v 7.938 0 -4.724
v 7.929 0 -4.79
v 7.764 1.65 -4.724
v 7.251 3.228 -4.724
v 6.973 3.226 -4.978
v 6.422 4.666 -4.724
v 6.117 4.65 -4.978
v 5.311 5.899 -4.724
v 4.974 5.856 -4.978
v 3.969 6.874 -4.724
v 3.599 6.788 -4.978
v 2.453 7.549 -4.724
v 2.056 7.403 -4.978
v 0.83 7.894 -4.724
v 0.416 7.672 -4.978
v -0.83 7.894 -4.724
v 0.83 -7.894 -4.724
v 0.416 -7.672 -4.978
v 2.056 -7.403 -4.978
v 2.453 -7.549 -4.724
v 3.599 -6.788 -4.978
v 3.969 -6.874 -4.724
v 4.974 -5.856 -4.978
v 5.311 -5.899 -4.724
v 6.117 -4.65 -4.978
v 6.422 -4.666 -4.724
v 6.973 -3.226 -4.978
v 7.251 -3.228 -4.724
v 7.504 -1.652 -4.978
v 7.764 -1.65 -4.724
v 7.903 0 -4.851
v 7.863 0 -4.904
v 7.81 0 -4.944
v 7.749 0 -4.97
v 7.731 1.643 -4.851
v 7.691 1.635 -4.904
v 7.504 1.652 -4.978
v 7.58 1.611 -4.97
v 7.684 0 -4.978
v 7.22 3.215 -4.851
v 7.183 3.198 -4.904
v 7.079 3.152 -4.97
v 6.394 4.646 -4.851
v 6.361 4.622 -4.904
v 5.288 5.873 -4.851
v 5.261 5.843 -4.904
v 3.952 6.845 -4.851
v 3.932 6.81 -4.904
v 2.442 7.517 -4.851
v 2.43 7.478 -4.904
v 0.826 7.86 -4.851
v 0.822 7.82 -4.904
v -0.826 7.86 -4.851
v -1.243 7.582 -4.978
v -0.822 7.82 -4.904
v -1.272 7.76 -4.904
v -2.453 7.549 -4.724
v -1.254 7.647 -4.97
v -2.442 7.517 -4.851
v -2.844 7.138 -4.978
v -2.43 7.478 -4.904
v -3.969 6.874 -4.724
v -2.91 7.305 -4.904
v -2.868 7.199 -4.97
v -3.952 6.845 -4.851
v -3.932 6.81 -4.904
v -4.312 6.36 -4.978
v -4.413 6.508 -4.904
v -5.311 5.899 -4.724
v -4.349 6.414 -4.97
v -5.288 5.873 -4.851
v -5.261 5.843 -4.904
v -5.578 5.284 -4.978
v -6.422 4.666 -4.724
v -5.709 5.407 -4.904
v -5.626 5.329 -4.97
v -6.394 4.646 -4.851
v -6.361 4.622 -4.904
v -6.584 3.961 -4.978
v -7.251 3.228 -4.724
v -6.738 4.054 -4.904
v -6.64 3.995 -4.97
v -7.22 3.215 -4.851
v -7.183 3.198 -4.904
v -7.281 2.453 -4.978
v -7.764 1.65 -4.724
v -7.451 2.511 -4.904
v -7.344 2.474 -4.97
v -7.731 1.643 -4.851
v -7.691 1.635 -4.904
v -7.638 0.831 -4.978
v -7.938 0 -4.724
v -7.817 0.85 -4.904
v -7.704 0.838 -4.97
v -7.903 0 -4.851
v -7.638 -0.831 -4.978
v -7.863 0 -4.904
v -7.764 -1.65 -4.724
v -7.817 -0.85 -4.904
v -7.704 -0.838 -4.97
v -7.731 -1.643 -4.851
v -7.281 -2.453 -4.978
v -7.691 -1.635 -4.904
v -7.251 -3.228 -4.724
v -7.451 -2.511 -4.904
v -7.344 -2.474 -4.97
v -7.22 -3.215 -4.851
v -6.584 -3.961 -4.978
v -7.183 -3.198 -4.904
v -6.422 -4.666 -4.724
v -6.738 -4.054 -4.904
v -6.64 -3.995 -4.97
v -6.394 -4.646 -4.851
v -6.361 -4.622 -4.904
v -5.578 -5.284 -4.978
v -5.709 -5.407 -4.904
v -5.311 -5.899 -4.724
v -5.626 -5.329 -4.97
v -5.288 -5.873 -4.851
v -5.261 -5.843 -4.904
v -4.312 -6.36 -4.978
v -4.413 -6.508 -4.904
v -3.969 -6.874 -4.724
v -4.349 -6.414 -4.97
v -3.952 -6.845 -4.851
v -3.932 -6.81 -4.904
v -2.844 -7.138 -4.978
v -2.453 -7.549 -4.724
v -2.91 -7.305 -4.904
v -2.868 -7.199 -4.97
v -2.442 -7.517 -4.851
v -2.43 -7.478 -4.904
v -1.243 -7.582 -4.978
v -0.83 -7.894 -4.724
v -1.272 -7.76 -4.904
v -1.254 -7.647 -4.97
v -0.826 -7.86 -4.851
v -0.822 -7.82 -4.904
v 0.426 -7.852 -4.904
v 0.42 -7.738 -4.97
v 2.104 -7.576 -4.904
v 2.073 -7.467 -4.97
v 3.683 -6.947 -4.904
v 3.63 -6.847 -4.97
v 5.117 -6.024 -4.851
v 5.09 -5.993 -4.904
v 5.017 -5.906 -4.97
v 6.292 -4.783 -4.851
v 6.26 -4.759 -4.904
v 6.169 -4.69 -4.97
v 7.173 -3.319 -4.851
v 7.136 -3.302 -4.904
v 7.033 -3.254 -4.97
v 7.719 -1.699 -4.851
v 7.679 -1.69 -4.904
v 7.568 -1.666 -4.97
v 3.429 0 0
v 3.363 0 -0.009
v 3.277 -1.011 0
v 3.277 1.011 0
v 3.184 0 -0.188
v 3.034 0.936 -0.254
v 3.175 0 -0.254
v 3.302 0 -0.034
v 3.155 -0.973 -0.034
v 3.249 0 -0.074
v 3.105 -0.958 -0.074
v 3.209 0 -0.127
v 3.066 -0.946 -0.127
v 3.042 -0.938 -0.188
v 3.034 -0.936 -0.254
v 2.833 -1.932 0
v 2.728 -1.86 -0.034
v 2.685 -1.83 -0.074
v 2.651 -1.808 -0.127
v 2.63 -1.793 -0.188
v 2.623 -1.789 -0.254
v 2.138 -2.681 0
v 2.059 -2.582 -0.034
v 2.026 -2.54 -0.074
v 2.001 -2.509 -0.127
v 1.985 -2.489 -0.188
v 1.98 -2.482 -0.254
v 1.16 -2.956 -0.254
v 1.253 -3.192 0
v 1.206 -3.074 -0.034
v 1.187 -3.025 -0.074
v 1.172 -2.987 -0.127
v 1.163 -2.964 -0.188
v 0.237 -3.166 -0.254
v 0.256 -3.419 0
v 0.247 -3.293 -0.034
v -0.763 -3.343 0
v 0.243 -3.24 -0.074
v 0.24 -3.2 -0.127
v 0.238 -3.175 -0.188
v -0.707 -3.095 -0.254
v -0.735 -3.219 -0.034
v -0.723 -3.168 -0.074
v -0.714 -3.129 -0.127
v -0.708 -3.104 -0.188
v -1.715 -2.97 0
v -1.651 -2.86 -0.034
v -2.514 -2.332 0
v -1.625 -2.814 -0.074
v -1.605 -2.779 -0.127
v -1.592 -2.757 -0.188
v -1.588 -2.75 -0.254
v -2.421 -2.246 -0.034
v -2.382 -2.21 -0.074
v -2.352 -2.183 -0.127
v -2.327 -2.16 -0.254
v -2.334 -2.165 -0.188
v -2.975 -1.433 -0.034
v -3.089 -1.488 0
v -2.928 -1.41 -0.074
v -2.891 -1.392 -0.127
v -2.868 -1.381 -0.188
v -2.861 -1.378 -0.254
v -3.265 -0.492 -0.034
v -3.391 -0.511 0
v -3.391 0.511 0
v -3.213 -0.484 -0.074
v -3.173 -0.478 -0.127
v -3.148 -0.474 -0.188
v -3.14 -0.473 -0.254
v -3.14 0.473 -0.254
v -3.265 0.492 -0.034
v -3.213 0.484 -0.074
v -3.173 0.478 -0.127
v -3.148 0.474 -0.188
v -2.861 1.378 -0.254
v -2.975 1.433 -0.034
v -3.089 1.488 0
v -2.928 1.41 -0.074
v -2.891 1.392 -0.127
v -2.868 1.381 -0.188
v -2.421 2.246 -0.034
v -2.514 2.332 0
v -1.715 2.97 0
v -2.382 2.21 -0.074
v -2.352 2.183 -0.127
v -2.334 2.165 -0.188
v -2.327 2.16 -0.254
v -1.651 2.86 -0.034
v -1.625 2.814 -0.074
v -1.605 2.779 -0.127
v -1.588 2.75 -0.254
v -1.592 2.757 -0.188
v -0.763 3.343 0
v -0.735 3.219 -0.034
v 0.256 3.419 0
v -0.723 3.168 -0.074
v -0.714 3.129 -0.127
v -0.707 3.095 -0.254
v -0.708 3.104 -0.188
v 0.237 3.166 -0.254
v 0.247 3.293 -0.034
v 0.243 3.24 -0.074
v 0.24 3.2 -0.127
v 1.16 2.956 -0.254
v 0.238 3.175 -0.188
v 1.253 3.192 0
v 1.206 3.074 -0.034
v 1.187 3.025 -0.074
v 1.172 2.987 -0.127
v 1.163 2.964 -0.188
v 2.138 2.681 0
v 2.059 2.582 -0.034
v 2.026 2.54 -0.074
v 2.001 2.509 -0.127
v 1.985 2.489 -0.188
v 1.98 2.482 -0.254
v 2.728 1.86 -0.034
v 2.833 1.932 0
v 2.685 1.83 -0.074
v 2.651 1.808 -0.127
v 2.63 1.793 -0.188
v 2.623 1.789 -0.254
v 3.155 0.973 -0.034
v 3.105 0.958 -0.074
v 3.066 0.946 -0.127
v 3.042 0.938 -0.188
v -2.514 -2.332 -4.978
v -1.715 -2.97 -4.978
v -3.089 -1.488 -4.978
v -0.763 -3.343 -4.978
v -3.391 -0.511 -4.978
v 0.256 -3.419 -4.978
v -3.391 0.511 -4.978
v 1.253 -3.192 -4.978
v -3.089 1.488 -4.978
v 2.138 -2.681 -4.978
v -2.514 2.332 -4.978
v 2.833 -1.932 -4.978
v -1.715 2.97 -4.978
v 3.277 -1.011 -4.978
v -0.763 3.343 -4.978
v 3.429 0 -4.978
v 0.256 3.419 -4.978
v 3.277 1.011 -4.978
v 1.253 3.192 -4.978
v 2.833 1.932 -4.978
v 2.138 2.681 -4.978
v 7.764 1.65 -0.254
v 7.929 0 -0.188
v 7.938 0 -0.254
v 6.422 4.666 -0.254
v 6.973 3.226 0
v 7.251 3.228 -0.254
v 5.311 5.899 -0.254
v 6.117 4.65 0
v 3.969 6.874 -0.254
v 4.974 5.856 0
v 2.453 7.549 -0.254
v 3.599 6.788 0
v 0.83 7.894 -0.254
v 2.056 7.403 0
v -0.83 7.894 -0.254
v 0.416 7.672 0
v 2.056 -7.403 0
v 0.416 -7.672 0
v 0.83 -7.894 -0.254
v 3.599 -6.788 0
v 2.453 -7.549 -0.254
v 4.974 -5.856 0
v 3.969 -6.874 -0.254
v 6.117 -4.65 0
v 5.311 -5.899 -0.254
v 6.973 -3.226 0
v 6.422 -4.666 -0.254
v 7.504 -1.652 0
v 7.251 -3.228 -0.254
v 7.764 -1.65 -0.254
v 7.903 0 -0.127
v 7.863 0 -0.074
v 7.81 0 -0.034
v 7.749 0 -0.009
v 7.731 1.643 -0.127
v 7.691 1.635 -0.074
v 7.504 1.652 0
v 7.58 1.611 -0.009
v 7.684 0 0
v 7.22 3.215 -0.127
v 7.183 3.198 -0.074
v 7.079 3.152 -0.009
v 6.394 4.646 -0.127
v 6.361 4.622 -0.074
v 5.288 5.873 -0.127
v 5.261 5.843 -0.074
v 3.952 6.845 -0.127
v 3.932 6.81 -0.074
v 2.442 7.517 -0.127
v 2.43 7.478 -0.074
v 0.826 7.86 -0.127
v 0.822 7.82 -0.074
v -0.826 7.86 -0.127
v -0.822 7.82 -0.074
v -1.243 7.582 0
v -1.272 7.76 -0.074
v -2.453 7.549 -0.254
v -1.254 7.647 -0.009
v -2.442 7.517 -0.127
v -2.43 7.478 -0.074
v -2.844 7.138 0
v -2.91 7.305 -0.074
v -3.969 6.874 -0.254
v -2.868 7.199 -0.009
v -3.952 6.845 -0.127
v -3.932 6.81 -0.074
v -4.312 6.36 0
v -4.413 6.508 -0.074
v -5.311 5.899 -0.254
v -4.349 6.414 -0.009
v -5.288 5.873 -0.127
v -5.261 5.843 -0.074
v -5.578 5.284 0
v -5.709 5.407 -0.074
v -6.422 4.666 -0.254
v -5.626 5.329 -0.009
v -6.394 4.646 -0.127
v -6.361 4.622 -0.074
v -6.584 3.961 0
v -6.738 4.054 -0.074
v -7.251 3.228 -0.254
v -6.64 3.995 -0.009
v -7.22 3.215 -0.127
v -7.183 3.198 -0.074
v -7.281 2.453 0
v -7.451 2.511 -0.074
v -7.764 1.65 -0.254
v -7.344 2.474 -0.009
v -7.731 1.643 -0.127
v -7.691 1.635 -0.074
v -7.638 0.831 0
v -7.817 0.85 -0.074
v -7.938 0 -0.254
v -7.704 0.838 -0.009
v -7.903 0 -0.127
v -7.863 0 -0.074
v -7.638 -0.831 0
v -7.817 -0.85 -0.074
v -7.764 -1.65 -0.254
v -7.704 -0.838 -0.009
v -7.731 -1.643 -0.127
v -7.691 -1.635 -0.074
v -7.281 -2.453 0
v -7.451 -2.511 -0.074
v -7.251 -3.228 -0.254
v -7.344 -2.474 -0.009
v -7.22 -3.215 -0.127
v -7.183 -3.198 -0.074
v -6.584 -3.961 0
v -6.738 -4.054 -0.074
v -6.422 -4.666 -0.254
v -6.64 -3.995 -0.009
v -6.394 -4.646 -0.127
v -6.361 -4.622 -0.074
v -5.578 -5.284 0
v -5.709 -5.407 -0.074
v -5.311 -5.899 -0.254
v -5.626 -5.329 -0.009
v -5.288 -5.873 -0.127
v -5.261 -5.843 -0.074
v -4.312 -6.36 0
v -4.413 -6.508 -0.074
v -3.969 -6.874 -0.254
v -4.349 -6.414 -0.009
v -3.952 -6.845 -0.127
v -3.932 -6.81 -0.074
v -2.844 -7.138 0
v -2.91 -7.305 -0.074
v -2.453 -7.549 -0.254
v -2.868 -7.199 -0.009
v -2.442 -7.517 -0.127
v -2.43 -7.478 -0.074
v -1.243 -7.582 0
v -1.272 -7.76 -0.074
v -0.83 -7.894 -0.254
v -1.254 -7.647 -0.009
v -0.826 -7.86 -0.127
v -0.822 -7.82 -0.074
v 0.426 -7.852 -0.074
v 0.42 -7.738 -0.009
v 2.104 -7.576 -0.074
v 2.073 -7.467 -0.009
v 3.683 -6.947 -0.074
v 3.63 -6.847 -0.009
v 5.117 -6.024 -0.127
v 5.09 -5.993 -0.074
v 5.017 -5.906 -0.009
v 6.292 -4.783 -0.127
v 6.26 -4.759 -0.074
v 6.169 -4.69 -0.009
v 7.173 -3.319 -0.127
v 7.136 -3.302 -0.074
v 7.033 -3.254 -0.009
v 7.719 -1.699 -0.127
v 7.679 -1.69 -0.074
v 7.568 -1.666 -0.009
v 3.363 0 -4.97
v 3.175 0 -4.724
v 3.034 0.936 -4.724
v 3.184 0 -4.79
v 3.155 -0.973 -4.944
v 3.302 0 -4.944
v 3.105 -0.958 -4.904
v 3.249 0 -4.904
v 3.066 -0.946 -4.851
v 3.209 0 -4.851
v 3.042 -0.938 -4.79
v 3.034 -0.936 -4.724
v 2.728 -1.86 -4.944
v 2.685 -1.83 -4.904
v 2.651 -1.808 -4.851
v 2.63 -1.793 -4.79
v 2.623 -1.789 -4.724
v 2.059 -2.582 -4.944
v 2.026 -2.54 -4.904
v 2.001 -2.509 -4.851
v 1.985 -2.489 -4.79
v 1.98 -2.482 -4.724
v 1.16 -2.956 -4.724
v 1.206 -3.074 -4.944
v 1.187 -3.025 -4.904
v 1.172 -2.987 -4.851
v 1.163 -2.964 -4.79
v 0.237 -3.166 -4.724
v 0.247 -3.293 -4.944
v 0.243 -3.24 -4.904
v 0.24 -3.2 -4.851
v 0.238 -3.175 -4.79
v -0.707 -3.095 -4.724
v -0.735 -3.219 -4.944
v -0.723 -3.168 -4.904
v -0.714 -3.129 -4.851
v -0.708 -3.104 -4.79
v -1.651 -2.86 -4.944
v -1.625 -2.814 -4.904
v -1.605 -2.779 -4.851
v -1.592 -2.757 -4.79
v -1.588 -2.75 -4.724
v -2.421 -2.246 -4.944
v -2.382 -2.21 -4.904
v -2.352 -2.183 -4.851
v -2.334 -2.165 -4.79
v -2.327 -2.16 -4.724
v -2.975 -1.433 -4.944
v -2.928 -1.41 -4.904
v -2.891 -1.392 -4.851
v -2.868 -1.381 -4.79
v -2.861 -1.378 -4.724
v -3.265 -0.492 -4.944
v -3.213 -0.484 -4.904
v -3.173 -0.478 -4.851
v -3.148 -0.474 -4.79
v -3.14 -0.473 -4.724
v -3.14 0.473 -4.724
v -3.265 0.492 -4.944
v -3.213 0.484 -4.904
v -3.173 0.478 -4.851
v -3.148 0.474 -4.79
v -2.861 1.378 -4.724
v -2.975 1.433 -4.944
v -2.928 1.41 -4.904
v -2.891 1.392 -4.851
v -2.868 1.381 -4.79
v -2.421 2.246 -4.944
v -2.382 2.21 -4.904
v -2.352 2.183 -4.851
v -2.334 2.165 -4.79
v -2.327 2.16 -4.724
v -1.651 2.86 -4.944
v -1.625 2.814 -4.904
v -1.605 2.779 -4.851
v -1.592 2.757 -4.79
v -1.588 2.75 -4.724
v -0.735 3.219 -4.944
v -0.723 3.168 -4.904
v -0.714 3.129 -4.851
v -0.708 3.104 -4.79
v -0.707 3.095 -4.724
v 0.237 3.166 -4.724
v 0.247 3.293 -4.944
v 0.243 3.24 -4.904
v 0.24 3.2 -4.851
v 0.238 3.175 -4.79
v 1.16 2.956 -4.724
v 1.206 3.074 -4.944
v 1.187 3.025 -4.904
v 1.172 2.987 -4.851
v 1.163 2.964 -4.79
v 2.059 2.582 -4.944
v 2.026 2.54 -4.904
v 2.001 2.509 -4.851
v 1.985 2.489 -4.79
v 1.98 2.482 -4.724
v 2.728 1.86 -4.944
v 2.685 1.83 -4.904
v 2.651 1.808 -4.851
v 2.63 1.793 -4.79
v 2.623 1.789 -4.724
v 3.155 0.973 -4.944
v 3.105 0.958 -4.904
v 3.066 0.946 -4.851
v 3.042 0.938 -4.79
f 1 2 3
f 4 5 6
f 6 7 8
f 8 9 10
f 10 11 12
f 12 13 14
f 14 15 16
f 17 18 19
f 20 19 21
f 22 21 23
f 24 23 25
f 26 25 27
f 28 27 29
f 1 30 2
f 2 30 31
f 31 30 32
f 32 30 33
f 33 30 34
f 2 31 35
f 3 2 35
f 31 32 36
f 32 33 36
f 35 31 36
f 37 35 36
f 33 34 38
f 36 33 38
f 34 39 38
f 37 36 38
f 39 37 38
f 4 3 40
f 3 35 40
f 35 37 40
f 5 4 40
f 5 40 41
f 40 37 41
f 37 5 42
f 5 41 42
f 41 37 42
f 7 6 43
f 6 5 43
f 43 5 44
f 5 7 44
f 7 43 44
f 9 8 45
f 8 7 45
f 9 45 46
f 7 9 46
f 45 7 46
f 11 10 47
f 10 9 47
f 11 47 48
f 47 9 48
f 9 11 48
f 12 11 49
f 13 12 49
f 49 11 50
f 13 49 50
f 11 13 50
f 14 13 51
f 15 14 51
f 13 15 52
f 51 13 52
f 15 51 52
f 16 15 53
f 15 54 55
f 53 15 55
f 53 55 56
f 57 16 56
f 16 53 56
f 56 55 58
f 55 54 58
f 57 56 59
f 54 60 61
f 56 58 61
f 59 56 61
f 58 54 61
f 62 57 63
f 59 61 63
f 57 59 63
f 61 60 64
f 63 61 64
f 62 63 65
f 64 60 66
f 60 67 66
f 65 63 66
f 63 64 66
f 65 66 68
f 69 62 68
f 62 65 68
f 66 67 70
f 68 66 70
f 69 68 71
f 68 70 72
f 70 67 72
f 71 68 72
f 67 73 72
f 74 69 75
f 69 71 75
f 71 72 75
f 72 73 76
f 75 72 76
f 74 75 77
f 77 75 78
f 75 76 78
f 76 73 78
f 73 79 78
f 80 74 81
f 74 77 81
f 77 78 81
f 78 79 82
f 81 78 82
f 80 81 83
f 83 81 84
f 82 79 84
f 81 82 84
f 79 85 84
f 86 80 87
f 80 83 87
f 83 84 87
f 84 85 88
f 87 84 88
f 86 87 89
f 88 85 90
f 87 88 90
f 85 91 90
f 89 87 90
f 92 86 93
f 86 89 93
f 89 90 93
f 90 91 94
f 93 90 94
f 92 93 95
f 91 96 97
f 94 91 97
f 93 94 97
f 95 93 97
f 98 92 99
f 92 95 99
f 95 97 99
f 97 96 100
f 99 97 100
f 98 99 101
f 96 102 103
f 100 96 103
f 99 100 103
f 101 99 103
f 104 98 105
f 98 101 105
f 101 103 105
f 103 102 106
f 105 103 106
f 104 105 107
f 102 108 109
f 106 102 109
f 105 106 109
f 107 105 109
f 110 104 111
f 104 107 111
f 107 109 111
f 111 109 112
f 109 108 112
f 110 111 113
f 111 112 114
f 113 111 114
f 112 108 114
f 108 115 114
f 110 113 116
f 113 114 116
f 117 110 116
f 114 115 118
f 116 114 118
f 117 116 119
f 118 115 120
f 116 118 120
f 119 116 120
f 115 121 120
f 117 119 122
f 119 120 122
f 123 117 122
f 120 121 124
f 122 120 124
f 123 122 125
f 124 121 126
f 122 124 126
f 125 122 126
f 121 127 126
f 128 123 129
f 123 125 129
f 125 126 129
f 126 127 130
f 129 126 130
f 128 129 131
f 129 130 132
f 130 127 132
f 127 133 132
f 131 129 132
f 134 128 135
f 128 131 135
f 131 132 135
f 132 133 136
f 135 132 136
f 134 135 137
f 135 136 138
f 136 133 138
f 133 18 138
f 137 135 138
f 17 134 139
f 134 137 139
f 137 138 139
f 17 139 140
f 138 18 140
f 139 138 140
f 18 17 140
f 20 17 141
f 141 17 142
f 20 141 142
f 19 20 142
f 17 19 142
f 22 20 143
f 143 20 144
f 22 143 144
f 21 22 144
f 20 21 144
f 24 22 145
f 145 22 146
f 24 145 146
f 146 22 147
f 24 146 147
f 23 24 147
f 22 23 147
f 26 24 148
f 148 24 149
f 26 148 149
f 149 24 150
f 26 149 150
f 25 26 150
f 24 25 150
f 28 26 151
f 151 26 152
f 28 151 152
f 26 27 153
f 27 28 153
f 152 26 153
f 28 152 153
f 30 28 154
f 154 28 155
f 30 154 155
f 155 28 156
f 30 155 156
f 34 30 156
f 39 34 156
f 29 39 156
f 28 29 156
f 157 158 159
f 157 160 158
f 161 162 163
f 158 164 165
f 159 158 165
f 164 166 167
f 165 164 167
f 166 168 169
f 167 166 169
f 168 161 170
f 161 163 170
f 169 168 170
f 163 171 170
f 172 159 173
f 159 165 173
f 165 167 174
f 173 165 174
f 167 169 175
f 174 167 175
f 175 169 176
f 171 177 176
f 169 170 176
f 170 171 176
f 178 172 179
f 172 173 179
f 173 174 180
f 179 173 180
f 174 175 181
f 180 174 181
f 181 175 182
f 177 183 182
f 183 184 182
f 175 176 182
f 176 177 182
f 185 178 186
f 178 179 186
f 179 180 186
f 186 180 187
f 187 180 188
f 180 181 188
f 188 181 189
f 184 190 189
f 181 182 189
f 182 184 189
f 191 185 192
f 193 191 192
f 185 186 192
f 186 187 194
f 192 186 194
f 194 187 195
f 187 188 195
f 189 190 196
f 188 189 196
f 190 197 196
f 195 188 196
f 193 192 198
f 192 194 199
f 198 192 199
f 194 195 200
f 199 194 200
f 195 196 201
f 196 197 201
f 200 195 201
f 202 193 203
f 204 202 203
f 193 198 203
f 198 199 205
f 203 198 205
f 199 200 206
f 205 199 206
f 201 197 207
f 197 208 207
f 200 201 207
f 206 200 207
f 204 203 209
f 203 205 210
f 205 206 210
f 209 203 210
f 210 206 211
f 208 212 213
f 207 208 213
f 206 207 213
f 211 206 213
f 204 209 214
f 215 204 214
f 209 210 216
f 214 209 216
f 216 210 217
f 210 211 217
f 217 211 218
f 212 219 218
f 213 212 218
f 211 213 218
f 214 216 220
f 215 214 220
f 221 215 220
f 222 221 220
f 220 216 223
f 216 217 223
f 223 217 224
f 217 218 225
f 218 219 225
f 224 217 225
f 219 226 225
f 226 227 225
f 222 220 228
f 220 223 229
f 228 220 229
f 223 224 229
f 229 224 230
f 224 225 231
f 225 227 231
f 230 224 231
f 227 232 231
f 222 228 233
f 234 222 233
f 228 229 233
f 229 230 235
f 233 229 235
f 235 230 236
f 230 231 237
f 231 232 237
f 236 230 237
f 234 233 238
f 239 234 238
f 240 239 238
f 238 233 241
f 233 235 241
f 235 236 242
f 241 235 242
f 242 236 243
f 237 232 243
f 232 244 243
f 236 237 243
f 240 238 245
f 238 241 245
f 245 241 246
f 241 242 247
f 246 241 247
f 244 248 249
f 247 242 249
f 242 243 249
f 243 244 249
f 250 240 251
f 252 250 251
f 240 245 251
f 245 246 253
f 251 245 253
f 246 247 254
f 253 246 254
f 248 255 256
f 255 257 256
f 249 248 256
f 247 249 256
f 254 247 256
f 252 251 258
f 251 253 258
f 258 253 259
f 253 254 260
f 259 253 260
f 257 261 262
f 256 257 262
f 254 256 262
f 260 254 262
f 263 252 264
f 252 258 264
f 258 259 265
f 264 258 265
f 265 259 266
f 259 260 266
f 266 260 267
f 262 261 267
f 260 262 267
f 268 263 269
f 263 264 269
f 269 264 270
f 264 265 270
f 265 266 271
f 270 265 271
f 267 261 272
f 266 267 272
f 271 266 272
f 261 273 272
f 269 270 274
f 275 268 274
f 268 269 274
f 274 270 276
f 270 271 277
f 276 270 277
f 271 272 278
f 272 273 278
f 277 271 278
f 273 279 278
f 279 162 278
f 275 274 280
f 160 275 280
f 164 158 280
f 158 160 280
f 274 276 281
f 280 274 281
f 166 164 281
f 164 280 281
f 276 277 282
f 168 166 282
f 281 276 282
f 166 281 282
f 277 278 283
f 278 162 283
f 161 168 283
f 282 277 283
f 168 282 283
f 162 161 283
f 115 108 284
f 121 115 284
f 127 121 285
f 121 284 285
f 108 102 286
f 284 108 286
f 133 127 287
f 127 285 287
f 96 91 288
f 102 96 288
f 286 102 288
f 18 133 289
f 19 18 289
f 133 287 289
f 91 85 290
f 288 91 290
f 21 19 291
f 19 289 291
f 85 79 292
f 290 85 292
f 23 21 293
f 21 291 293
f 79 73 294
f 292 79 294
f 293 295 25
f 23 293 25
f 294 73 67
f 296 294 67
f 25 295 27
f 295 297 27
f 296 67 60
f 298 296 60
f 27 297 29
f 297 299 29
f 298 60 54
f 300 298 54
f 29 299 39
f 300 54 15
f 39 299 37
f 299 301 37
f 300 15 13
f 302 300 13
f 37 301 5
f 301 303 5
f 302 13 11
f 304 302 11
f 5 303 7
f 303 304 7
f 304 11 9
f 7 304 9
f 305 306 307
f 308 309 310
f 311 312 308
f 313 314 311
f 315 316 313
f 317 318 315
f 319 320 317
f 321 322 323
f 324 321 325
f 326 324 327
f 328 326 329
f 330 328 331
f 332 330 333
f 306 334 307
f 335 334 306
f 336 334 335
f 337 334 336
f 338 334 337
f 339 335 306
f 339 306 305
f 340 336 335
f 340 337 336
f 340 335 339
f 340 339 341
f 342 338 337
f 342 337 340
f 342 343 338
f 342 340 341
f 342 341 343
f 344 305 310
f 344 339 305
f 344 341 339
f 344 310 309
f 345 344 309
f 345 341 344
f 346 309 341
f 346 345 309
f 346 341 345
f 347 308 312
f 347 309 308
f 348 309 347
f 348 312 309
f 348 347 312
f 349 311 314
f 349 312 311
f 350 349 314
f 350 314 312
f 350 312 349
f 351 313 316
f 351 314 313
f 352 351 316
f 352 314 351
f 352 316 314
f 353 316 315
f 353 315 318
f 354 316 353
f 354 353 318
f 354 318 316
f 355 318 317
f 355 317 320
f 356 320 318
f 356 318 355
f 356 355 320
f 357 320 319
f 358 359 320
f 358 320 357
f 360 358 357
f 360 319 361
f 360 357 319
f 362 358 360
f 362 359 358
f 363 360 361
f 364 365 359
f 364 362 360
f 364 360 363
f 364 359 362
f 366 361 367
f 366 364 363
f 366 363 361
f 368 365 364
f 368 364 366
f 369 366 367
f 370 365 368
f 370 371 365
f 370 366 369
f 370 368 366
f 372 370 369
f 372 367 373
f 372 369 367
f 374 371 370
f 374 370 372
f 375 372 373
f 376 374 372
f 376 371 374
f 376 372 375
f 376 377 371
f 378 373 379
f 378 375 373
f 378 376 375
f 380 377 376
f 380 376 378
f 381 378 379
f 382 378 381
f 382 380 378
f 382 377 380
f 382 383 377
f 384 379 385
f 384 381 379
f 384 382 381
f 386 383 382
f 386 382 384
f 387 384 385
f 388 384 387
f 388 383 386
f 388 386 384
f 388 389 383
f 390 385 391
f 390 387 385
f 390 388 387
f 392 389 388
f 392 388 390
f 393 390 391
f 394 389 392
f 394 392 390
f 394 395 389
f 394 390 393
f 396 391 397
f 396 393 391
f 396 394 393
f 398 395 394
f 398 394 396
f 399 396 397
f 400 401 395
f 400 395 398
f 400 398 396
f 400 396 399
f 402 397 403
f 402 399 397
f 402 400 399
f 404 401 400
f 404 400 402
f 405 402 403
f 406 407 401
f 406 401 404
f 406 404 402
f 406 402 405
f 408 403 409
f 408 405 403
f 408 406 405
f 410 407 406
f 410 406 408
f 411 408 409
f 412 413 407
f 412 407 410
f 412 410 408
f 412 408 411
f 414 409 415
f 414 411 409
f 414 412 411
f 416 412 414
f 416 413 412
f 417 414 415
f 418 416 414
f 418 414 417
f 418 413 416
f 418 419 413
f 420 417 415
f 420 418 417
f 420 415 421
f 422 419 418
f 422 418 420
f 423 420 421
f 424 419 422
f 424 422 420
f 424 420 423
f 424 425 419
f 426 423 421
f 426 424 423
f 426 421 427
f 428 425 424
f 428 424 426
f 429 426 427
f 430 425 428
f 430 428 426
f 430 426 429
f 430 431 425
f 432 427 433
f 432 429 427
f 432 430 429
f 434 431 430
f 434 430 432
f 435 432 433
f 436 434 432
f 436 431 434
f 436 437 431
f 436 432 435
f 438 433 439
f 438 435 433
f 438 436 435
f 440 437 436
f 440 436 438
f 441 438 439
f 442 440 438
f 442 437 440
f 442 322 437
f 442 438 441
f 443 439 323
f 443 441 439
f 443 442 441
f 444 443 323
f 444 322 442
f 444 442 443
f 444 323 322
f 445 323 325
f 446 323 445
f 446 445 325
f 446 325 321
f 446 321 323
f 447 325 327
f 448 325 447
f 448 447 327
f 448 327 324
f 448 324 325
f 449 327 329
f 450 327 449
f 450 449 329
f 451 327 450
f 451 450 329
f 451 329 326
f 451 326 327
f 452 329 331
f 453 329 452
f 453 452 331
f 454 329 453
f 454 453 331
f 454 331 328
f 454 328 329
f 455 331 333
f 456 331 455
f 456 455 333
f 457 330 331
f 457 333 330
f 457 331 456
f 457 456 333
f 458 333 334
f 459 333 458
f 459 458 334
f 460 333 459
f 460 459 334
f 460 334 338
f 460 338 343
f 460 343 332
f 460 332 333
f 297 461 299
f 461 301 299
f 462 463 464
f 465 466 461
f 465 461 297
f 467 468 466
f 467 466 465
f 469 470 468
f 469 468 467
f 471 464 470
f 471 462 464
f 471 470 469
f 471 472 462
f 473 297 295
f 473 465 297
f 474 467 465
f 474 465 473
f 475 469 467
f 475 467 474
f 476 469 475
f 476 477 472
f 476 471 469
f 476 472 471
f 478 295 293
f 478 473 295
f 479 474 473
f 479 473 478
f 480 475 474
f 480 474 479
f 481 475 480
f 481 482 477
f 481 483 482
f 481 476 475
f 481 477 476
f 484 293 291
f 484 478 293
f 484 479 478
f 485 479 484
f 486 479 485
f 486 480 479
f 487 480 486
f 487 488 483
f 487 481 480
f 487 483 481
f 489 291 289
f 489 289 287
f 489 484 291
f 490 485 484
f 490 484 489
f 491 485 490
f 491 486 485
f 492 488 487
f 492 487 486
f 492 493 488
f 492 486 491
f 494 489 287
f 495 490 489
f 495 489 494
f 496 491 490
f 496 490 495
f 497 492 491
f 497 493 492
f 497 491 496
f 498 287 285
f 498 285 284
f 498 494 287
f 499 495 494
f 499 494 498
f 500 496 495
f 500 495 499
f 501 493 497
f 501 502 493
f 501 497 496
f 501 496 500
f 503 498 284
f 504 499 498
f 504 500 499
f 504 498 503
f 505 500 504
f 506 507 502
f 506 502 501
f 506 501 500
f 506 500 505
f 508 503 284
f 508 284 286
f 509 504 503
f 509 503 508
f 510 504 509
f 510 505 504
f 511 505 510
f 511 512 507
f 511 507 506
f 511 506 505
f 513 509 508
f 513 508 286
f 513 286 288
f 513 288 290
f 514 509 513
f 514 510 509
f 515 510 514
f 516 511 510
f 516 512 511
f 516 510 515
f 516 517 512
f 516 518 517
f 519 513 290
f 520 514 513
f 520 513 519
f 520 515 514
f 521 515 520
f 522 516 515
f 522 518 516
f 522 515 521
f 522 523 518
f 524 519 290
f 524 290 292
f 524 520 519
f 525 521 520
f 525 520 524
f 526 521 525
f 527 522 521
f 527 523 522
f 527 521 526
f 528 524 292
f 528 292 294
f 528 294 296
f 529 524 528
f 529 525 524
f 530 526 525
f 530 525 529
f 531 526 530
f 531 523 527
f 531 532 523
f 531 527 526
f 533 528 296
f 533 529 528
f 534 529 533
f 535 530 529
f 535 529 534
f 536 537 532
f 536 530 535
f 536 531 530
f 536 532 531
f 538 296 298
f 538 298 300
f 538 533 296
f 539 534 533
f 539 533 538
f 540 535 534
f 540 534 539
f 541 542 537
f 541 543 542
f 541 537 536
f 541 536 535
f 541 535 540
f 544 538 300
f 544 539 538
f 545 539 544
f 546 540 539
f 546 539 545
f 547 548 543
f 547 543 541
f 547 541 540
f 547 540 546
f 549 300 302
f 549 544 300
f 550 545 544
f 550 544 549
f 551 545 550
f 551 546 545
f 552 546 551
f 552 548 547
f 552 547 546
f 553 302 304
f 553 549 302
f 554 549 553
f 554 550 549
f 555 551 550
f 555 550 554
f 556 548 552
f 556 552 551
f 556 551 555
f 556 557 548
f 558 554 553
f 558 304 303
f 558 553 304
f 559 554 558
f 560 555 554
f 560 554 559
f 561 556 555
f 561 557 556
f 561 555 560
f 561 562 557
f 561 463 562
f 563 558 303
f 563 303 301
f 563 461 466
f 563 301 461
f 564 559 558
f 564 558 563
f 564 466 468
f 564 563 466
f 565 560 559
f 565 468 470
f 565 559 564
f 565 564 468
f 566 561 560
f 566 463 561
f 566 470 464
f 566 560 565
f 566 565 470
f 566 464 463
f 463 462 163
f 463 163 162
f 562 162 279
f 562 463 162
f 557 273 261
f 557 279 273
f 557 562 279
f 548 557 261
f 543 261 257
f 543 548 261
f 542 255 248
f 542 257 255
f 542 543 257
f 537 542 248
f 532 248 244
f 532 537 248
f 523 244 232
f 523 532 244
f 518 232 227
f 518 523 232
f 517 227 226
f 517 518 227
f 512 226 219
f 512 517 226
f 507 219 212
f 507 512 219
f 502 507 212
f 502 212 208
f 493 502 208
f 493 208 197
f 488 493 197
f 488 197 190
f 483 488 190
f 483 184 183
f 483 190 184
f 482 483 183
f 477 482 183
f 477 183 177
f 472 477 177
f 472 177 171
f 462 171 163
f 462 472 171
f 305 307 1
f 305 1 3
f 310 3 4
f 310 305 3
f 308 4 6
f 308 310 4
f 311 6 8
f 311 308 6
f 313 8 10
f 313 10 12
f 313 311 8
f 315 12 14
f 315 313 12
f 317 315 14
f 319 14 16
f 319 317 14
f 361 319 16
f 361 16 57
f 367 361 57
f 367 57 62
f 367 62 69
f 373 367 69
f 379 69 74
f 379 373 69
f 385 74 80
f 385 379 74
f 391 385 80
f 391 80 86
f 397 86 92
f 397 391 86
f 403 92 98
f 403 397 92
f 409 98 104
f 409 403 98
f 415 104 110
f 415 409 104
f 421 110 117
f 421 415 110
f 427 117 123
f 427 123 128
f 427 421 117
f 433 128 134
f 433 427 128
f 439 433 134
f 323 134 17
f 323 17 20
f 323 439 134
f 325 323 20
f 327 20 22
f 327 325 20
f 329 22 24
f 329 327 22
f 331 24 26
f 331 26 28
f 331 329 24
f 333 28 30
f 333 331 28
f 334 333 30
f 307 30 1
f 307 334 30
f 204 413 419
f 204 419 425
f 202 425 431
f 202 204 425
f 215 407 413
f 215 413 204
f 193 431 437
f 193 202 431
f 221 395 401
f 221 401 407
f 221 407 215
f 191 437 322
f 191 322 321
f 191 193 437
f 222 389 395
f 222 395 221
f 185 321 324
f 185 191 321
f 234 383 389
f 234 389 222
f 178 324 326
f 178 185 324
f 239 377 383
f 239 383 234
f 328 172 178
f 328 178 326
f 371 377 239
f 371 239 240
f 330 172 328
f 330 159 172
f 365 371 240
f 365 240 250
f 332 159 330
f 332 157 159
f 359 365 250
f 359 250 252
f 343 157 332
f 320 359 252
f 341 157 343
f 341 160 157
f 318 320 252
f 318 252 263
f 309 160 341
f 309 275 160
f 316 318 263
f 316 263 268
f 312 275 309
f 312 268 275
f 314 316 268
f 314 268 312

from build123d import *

# Parameters (mm, degrees)
SKETCH1_R               = 7.9375
BOSS_EXTRUDE1_DEPTH     = 4.9784
CUT_EXTRUDE1_DEPTH      = 13.279750774
CUT_EXTRUDE1_DEPTH_BACK = 13.279750774
SKETCH2_R               = 3.175
FILLET1_R               = 0.254
FILLET2_R               = 0.254


with BuildPart() as part:
    # Sketch1 → Boss-Extrude1 (new body)
    with BuildSketch(Plane.XY):
        Circle(SKETCH1_R)
    extrude(amount=-BOSS_EXTRUDE1_DEPTH)

    # Sketch2 → Cut-Extrude1 (cut, two sides: drawn at the far end of the back side and taken through both)
    with BuildSketch(Plane.XY.offset(-CUT_EXTRUDE1_DEPTH_BACK)):
        Circle(SKETCH2_R)
    extrude(amount=CUT_EXTRUDE1_DEPTH + CUT_EXTRUDE1_DEPTH_BACK, mode=Mode.SUBTRACT)

    # Fillet1
    fillet1_edges = [part.edges().sort_by_distance(p)[0] for p in [
        (-7.9375, 0, 0),
    ]]
    fillet(fillet1_edges, radius=FILLET1_R)

    # Fillet2
    fillet2_edges = [part.edges().sort_by_distance(p)[0] for p in [
        (-7.9375, 0, -4.9784),
        (-3.175, 0, 0),
        (-3.175, 0, -4.9784),
    ]]
    fillet(fillet2_edges, radius=FILLET2_R)


solid = part.part
